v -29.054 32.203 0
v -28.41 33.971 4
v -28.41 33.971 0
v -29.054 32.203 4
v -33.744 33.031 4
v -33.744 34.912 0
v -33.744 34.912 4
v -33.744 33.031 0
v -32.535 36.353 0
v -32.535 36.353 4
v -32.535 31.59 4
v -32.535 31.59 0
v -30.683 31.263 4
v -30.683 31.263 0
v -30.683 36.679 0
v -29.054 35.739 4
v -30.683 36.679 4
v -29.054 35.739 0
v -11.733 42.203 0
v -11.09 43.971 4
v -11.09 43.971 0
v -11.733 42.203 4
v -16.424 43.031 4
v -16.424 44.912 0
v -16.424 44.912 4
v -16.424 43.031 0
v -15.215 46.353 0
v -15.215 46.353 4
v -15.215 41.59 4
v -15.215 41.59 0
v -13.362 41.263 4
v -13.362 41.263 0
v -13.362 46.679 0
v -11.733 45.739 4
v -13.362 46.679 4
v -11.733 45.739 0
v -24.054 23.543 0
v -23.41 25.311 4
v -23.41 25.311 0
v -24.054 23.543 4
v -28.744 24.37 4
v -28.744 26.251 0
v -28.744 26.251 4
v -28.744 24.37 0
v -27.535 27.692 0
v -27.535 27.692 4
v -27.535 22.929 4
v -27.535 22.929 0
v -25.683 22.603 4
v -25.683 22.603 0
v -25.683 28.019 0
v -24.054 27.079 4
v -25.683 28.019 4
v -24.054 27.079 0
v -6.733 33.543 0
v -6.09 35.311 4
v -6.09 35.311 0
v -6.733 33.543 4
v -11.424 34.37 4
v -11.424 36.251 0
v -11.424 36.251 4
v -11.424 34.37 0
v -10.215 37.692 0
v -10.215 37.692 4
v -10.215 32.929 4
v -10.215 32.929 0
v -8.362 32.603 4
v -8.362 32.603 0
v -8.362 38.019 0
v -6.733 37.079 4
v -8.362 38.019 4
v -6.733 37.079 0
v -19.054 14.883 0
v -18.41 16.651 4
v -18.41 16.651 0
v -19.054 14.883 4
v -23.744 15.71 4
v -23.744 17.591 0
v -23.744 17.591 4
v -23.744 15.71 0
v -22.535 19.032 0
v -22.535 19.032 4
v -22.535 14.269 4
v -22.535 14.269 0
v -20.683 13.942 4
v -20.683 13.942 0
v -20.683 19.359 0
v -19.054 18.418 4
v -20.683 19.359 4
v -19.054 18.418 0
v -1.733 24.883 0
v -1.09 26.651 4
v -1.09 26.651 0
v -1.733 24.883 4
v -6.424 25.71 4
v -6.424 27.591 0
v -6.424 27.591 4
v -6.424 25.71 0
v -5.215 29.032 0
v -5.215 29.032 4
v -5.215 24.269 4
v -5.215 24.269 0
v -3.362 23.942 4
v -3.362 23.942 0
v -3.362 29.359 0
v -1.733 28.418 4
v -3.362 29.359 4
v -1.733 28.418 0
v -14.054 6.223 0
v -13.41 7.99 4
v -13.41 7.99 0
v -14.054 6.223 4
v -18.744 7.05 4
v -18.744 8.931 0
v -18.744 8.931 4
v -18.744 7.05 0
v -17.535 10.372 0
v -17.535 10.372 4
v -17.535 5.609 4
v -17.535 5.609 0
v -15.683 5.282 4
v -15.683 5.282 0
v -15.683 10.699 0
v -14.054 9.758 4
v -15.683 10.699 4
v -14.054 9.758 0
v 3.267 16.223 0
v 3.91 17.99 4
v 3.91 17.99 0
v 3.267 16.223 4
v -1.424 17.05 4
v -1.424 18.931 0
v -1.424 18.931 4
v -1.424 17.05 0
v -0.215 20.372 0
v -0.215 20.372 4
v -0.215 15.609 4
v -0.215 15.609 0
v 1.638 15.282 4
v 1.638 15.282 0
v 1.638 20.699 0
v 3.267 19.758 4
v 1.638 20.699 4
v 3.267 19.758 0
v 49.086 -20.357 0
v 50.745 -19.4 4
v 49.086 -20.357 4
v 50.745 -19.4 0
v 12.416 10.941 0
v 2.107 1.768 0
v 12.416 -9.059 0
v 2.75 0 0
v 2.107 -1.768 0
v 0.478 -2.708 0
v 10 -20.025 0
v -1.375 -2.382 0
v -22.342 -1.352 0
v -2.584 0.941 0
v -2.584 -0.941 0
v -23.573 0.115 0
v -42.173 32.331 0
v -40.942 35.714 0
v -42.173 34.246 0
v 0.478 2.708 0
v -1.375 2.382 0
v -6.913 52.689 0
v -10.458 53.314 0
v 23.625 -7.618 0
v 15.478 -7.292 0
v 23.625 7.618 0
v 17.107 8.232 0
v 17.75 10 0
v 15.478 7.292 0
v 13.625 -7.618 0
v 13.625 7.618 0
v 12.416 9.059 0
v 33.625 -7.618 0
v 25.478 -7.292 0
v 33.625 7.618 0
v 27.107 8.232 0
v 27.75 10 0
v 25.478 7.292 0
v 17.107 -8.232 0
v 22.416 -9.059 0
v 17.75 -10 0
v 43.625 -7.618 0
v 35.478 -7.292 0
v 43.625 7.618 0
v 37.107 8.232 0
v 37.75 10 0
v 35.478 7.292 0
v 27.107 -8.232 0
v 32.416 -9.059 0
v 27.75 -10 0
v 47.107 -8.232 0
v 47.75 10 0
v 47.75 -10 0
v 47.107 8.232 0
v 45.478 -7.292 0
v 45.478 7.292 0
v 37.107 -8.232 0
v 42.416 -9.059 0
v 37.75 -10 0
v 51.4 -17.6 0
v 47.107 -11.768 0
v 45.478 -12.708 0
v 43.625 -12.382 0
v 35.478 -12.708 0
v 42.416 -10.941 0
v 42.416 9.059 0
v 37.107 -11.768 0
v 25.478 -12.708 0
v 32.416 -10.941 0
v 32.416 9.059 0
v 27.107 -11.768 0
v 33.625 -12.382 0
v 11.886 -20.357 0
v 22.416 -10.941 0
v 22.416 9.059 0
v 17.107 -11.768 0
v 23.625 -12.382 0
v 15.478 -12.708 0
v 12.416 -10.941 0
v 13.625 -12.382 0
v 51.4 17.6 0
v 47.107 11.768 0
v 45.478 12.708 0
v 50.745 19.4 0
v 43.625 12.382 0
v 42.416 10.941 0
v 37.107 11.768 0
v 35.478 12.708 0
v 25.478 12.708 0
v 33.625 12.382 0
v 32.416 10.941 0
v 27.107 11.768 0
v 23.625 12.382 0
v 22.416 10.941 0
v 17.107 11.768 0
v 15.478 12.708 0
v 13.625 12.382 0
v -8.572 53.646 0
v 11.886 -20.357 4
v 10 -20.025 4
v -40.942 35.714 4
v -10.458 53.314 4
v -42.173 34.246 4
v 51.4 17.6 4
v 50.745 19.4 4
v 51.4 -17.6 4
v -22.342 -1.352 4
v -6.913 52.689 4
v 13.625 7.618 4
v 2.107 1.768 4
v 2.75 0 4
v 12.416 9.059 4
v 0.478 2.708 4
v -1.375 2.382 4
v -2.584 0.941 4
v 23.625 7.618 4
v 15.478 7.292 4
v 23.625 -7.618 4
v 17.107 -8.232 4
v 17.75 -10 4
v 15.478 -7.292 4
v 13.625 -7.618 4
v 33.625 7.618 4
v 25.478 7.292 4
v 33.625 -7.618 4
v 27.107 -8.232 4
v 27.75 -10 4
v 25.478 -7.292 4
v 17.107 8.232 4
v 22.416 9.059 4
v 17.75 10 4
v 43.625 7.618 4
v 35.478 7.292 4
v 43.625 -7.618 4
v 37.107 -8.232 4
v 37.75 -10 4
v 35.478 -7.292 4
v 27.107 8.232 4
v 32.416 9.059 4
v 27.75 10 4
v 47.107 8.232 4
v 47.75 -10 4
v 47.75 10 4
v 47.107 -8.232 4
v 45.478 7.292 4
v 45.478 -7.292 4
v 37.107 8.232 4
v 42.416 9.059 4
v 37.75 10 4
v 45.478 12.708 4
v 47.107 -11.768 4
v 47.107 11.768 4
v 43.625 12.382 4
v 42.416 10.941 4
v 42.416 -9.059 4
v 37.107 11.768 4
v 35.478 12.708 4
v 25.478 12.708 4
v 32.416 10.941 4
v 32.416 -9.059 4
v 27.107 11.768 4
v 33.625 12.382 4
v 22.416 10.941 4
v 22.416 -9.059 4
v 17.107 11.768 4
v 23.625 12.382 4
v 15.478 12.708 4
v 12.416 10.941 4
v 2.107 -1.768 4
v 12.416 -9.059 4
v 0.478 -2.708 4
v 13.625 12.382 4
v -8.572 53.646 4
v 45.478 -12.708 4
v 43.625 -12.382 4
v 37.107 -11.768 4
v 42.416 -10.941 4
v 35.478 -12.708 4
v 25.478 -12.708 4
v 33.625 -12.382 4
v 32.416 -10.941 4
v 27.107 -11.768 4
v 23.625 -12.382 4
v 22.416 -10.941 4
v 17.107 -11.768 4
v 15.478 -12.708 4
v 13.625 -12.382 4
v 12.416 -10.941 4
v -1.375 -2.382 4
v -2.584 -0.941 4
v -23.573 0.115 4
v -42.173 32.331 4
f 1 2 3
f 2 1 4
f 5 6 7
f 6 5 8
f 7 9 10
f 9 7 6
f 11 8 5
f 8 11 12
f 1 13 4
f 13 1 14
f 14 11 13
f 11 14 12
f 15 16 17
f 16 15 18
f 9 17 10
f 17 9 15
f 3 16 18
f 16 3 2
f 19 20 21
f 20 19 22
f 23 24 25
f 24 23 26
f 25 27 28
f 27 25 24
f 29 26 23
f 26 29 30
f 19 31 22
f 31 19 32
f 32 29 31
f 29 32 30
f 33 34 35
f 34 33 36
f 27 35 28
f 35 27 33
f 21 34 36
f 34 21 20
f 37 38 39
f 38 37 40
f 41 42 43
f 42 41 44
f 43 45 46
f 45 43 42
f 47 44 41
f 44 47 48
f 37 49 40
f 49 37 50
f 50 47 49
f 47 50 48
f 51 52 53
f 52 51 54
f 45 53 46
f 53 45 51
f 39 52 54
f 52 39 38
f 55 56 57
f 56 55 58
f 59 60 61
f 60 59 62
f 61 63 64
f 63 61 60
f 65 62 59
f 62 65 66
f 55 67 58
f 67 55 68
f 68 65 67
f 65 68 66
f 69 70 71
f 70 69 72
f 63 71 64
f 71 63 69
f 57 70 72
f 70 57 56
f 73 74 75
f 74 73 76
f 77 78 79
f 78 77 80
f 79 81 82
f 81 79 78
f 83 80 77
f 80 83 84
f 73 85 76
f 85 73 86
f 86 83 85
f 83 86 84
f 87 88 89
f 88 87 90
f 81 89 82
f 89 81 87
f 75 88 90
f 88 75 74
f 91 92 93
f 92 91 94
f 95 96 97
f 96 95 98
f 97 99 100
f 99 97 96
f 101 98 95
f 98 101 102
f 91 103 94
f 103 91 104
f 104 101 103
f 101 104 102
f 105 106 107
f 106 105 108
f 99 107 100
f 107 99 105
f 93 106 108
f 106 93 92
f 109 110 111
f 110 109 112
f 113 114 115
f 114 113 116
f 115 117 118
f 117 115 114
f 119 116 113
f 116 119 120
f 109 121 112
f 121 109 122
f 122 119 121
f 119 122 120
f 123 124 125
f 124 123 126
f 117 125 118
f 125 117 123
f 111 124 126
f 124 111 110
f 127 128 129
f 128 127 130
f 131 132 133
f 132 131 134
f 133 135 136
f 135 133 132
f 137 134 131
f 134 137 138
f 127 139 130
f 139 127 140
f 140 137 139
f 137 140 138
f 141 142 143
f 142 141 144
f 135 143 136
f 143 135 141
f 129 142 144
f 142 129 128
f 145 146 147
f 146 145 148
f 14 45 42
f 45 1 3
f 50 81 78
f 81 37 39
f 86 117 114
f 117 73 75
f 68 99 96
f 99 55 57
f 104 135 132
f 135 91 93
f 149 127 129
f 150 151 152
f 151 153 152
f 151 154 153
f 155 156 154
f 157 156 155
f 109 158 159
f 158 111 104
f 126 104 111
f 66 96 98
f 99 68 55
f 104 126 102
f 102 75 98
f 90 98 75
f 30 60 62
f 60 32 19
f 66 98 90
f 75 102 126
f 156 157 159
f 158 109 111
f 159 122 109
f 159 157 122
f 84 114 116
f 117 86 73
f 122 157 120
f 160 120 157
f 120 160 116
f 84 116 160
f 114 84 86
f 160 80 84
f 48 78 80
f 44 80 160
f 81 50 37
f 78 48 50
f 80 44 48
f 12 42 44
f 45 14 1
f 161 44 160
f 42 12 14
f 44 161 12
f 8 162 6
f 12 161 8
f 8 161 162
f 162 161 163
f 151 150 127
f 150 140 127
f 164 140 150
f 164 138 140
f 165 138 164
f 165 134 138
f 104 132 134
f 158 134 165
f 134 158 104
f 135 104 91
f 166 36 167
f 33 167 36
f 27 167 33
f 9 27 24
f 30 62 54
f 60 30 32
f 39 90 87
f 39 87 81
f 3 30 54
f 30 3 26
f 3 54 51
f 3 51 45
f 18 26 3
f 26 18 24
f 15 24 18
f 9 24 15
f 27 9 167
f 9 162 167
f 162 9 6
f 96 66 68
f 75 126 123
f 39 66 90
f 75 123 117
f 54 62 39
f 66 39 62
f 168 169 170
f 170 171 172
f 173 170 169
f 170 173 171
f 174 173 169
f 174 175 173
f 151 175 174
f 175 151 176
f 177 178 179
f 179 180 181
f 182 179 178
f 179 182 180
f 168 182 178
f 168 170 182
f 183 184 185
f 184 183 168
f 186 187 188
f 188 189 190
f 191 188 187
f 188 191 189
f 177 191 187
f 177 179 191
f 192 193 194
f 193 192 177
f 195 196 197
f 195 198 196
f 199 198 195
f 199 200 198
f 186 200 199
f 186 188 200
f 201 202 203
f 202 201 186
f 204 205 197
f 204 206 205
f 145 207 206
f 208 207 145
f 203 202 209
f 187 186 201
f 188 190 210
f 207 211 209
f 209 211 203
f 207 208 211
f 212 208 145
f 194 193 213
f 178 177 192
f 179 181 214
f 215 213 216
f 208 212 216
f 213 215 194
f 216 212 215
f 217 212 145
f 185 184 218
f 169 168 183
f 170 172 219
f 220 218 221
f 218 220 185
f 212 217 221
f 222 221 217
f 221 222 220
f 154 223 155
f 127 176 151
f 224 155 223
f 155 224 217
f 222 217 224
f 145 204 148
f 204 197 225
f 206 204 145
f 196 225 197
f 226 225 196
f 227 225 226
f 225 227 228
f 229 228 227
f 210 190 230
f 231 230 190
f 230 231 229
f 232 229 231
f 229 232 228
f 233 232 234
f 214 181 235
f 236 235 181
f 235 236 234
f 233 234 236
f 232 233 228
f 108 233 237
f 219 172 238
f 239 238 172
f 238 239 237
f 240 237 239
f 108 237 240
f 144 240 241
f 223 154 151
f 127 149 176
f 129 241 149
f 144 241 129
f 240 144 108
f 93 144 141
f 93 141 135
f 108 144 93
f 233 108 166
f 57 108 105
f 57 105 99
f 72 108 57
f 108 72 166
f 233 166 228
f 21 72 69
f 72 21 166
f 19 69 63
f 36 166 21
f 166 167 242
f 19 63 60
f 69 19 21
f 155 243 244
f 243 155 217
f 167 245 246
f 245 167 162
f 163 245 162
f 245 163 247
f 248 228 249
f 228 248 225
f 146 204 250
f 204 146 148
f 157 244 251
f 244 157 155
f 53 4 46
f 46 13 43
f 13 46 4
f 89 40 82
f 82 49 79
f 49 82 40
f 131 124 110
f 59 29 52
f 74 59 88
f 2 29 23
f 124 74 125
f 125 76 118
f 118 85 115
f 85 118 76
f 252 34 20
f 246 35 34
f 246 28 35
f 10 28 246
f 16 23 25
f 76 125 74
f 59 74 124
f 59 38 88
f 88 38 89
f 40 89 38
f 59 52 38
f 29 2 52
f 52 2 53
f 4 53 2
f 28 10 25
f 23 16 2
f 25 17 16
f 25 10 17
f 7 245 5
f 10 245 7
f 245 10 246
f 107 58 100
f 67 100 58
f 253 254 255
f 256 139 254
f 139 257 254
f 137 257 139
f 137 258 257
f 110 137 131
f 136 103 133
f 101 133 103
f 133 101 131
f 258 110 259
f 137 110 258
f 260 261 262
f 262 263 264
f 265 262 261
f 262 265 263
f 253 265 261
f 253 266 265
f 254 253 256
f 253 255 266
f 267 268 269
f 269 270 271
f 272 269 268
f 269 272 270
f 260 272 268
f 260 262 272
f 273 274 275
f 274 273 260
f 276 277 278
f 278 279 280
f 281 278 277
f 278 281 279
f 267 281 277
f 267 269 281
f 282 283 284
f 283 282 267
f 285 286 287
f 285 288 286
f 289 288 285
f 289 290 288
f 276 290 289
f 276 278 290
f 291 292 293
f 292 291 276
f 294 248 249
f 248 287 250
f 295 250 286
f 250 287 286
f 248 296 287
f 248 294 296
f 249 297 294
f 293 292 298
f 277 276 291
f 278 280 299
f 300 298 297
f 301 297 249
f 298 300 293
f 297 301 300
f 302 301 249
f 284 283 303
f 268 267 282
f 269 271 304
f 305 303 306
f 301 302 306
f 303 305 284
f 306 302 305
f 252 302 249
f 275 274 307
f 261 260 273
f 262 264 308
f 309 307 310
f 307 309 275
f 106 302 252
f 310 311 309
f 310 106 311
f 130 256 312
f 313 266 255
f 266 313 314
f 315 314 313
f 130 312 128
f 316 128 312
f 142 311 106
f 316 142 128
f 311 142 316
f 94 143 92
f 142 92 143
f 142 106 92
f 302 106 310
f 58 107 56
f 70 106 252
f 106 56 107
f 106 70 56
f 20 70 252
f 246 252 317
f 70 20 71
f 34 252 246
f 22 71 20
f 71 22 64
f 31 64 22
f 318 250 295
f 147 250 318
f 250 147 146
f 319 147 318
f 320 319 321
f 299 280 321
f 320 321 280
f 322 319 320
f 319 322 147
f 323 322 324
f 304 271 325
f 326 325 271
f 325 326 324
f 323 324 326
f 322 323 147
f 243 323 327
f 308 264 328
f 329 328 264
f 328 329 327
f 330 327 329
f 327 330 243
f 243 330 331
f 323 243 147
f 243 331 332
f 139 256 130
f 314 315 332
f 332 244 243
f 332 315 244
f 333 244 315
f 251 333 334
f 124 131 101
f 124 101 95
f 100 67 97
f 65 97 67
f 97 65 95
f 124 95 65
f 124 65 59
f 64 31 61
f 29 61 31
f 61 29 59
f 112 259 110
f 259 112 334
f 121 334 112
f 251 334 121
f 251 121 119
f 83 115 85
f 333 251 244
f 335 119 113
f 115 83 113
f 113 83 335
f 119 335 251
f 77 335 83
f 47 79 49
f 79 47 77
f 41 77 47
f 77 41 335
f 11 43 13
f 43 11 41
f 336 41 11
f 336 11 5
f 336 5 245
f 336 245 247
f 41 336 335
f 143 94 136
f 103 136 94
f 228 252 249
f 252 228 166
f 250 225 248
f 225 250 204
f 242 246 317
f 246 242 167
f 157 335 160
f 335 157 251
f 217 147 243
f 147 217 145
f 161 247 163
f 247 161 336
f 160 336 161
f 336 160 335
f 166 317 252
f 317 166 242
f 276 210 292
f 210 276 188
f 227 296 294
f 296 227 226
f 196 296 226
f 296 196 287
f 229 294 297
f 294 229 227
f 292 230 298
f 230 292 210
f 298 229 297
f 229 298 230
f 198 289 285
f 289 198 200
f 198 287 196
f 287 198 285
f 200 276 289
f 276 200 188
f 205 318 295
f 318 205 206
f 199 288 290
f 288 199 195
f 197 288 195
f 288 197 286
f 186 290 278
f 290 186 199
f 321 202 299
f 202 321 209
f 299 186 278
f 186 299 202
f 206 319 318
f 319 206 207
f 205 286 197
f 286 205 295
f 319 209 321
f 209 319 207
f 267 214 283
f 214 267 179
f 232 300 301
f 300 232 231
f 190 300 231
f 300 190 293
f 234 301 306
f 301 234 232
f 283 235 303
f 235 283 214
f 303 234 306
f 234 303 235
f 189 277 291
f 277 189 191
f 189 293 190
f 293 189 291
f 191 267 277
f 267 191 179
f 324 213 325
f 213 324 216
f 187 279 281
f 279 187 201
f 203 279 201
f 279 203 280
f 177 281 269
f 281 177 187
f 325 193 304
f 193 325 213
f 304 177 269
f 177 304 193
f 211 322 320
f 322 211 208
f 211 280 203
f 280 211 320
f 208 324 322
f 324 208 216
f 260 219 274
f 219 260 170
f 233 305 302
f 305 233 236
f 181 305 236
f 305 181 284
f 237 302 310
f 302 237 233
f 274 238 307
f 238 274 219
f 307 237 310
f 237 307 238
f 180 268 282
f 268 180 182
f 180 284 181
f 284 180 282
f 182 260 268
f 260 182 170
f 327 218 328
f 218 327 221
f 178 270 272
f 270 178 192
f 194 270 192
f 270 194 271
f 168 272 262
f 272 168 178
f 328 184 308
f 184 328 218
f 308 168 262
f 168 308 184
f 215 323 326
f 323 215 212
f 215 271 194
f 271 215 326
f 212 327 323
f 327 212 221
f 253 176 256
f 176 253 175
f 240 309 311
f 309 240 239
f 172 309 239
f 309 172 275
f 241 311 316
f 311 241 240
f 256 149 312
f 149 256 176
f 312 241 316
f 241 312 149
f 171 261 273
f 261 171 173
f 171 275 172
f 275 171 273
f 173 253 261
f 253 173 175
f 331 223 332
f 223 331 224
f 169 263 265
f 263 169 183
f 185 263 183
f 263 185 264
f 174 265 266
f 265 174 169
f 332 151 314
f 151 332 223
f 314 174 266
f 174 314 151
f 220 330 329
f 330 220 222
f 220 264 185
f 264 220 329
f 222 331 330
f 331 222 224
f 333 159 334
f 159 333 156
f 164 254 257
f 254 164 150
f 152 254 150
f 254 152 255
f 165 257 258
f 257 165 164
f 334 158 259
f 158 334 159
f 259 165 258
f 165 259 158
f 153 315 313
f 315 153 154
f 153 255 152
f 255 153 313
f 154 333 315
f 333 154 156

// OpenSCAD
// rob@openpart.co.uk 20140204-03:18
// 17 hole joining plate to connect 40mm NOMINAL extrusion at 120 degrees
// V-Slot & others

module roundedRect(size, radius) {
	x = size[0];
	y = size[1];
	z = size[2];
	linear_extrude(height=z)
	hull()
	{
		// place 4 circles in the corners, with the given radius
		translate([(-x/2)+(radius/2), (-y/2)+(radius/2), 0])
		circle(r=radius);
		translate([(x/2)-(radius/2), (-y/2)+(radius/2), 0])
		circle(r=radius);
		translate([(-x/2)+(radius/2), (y/2)-(radius/2), 0])
		circle(r=radius);
		translate([(x/2)-(radius/2), (y/2)-(radius/2), 0])
		circle(r=radius);
	}
}
angle = 120;
hole = 5.5 / 2;
plate_width1 = 38;
plate_width2 = 38;
plate_width3 = 38;
plate_length1 = 40;
plate_length2 = 40;
plate_length3 = 40;
plate_thickness = 4;
extend_past_thickness = 2;
corner_radius = 2.8;

difference() {
hull () {
		rotate([0,0,angle]) {
			translate([30, 0, 0])
				roundedRect ([plate_length3, plate_width1, plate_thickness], corner_radius);
		}
		translate([30, 0, 0])
				roundedRect ([plate_length2, plate_width2, plate_thickness], corner_radius);
	}


		rotate([0,0,angle]) {
			translate([45,10,-1])
					cylinder(h = (extend_past_thickness+plate_thickness), r = hole);
			translate([45,-10,-1])
					cylinder(h = (extend_past_thickness+plate_thickness), r = hole);
			translate([35,10,-1])
					cylinder(h = (extend_past_thickness+plate_thickness), r = hole);
			translate([35,-10,-1])
					cylinder(h = (extend_past_thickness+plate_thickness), r = hole);
			translate([25,10,-1])
					cylinder(h = (extend_past_thickness+plate_thickness), r = hole);
			translate([25,-10,-1])
					cylinder(h = (extend_past_thickness+plate_thickness), r = hole);
			translate([15,10,-1])
					cylinder(h = (extend_past_thickness+plate_thickness), r = hole);
			translate([15,-10,-1])
					cylinder(h = (extend_past_thickness+plate_thickness), r = hole);
		}

		translate([45,10,-1])
				cylinder(h = (extend_past_thickness+plate_thickness), r = hole);
		translate([45,-10,-1])
				cylinder(h = (extend_past_thickness+plate_thickness), r = hole);
		translate([35,10,-1])
				cylinder(h = (extend_past_thickness+plate_thickness), r = hole);
		translate([35,-10,-1])
				cylinder(h = (extend_past_thickness+plate_thickness), r = hole);
		translate([25,10,-1])
				cylinder(h = (extend_past_thickness+plate_thickness), r = hole);
		translate([25,-10,-1])
				cylinder(h = (extend_past_thickness+plate_thickness), r = hole);
		translate([15,10,-1])
				cylinder(h = (extend_past_thickness+plate_thickness), r = hole);
		translate([15,-10,-1])
				cylinder(h = (extend_past_thickness+plate_thickness), r = hole);

		translate([0,0,-1])
				cylinder(h = (extend_past_thickness+plate_thickness), r = hole);

}
